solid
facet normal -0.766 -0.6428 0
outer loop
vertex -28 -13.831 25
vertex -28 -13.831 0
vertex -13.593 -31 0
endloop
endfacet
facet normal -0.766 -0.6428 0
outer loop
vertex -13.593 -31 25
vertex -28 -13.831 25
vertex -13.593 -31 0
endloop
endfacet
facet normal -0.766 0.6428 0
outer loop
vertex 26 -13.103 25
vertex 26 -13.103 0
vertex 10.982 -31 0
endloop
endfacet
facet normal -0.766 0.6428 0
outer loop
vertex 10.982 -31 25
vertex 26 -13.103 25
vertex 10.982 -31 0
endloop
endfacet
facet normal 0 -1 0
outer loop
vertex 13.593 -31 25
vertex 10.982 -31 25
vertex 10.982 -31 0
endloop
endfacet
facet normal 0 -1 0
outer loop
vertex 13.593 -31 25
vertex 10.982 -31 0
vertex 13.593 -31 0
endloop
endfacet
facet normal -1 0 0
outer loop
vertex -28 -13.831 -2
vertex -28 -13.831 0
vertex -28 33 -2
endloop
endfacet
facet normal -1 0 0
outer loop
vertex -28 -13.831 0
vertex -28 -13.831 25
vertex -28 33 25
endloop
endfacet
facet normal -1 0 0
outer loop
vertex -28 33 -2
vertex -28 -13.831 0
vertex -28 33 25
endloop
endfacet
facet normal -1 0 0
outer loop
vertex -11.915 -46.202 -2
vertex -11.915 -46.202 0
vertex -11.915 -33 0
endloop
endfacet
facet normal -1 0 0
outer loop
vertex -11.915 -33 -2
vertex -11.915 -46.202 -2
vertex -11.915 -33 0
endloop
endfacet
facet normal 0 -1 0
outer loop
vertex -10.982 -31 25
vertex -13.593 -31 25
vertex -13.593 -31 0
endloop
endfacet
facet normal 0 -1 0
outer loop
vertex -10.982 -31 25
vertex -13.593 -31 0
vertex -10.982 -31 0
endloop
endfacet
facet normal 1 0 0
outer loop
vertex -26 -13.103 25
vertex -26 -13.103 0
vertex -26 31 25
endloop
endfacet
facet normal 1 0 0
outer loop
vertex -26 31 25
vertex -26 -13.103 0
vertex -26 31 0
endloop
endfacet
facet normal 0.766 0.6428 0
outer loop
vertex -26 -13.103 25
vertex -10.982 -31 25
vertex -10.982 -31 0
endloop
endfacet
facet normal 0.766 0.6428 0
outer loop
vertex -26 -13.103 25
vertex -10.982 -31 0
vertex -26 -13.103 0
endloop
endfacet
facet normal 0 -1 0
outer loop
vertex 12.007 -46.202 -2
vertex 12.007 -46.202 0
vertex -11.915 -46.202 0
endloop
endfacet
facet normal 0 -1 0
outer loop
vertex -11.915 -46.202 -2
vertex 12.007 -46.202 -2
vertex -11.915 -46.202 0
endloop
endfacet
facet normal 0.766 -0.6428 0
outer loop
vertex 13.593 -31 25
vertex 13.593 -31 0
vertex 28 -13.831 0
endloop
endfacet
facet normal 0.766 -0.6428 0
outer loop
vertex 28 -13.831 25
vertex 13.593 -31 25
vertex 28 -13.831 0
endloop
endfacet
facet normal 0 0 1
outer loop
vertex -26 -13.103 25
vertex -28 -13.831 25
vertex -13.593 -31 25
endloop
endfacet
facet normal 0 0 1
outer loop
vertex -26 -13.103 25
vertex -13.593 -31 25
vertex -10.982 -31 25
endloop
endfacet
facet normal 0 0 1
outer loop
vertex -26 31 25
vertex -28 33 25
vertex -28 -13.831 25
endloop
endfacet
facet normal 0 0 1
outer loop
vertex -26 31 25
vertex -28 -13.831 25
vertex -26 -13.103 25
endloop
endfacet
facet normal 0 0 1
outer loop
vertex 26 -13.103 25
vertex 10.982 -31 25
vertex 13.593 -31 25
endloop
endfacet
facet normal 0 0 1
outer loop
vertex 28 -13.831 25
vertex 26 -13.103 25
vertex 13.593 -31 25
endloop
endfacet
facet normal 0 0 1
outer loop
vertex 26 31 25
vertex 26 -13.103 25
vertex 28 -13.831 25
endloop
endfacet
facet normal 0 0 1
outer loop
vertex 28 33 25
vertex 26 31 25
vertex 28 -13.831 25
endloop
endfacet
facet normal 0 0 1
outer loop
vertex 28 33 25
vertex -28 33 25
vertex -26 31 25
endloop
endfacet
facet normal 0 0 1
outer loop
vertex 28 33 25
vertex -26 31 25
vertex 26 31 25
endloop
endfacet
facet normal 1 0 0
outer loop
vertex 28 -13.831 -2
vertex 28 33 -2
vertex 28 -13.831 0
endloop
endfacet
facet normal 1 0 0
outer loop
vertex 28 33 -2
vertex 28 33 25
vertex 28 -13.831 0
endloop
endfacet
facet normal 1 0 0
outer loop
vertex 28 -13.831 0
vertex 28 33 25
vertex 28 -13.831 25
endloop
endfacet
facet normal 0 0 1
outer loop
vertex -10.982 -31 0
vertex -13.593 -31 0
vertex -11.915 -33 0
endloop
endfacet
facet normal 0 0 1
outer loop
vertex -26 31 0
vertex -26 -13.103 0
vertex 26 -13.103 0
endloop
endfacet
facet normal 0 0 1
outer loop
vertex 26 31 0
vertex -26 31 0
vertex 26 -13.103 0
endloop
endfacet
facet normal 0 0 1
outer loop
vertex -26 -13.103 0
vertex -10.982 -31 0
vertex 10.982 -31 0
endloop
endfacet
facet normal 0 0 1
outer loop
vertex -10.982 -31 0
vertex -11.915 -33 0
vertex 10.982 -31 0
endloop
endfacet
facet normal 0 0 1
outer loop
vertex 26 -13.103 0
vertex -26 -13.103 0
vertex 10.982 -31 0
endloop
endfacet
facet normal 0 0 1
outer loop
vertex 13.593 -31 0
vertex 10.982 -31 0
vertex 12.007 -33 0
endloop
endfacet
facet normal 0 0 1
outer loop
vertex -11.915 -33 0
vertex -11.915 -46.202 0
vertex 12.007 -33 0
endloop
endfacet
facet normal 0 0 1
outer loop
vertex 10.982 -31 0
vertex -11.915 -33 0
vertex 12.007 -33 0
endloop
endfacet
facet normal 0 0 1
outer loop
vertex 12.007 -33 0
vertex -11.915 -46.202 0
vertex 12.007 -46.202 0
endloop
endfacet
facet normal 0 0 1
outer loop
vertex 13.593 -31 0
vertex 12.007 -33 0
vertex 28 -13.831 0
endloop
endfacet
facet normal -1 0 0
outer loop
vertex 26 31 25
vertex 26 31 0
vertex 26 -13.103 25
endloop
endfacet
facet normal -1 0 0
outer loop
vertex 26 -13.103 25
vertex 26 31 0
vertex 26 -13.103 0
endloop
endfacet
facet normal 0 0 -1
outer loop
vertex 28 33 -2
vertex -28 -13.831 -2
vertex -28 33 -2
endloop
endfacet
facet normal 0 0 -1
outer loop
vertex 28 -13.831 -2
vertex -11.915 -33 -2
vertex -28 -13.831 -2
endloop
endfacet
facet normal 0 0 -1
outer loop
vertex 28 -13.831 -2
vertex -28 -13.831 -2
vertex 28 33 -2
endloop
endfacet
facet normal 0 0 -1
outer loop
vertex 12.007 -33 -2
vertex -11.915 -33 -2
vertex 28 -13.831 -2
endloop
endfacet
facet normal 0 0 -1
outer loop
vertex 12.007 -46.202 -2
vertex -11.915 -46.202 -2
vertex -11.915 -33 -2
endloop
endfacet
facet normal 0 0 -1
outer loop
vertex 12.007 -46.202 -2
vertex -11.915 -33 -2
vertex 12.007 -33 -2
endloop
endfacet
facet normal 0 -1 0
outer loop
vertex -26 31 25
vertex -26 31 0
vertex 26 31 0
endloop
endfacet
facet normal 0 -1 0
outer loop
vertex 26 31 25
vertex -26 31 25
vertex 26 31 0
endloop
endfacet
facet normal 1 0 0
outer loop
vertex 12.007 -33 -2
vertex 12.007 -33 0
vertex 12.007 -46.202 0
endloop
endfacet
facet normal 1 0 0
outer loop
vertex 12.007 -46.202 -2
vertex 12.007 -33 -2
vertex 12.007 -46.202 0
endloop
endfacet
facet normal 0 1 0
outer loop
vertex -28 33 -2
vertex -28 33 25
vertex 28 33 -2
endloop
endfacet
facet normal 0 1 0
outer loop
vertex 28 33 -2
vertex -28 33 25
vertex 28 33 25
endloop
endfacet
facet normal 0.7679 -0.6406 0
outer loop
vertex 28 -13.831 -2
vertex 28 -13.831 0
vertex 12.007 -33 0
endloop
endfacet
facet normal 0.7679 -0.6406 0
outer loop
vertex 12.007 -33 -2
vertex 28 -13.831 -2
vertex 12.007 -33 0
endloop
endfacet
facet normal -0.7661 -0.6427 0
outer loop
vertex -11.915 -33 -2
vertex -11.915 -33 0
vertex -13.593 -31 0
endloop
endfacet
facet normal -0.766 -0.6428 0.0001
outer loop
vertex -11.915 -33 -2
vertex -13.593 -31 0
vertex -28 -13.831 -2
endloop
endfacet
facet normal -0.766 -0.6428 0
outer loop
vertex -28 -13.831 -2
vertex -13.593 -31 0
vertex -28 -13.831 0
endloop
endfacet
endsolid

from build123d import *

# Parameters (mm, degrees)
F1_DEPTH = 25
F3_DEPTH = 2


with BuildPart() as f1:
    # F0 (on Top) → F1 (new body)
    with BuildSketch(Plane.XY):
        Polygon((-26, 31), (26, 31), (26, -13.102827), (10.982488, -31), (13.593303, -31), (28, -13.830767), (28, 33), (-28, 33), (-28, -13.830767), (-13.593303, -31), (-10.982488, -31), (-26, -13.102827), align=None)
    extrude(amount=F1_DEPTH)

    # F2 (on face) → F3 (join)
    with BuildSketch(Plane(origin=(0, 0, 0), x_dir=(1, 0, 0), z_dir=(0, 0, -1))):
        Polygon((-28, -33), (28, -33), (28, 13.830767), (12.006613, 33), (12.006613, 46.20152), (-11.915104, 46.20152), (-11.915104, 33), (-28, 13.830767), align=None)
    extrude(amount=F3_DEPTH)


solid = f1.part
